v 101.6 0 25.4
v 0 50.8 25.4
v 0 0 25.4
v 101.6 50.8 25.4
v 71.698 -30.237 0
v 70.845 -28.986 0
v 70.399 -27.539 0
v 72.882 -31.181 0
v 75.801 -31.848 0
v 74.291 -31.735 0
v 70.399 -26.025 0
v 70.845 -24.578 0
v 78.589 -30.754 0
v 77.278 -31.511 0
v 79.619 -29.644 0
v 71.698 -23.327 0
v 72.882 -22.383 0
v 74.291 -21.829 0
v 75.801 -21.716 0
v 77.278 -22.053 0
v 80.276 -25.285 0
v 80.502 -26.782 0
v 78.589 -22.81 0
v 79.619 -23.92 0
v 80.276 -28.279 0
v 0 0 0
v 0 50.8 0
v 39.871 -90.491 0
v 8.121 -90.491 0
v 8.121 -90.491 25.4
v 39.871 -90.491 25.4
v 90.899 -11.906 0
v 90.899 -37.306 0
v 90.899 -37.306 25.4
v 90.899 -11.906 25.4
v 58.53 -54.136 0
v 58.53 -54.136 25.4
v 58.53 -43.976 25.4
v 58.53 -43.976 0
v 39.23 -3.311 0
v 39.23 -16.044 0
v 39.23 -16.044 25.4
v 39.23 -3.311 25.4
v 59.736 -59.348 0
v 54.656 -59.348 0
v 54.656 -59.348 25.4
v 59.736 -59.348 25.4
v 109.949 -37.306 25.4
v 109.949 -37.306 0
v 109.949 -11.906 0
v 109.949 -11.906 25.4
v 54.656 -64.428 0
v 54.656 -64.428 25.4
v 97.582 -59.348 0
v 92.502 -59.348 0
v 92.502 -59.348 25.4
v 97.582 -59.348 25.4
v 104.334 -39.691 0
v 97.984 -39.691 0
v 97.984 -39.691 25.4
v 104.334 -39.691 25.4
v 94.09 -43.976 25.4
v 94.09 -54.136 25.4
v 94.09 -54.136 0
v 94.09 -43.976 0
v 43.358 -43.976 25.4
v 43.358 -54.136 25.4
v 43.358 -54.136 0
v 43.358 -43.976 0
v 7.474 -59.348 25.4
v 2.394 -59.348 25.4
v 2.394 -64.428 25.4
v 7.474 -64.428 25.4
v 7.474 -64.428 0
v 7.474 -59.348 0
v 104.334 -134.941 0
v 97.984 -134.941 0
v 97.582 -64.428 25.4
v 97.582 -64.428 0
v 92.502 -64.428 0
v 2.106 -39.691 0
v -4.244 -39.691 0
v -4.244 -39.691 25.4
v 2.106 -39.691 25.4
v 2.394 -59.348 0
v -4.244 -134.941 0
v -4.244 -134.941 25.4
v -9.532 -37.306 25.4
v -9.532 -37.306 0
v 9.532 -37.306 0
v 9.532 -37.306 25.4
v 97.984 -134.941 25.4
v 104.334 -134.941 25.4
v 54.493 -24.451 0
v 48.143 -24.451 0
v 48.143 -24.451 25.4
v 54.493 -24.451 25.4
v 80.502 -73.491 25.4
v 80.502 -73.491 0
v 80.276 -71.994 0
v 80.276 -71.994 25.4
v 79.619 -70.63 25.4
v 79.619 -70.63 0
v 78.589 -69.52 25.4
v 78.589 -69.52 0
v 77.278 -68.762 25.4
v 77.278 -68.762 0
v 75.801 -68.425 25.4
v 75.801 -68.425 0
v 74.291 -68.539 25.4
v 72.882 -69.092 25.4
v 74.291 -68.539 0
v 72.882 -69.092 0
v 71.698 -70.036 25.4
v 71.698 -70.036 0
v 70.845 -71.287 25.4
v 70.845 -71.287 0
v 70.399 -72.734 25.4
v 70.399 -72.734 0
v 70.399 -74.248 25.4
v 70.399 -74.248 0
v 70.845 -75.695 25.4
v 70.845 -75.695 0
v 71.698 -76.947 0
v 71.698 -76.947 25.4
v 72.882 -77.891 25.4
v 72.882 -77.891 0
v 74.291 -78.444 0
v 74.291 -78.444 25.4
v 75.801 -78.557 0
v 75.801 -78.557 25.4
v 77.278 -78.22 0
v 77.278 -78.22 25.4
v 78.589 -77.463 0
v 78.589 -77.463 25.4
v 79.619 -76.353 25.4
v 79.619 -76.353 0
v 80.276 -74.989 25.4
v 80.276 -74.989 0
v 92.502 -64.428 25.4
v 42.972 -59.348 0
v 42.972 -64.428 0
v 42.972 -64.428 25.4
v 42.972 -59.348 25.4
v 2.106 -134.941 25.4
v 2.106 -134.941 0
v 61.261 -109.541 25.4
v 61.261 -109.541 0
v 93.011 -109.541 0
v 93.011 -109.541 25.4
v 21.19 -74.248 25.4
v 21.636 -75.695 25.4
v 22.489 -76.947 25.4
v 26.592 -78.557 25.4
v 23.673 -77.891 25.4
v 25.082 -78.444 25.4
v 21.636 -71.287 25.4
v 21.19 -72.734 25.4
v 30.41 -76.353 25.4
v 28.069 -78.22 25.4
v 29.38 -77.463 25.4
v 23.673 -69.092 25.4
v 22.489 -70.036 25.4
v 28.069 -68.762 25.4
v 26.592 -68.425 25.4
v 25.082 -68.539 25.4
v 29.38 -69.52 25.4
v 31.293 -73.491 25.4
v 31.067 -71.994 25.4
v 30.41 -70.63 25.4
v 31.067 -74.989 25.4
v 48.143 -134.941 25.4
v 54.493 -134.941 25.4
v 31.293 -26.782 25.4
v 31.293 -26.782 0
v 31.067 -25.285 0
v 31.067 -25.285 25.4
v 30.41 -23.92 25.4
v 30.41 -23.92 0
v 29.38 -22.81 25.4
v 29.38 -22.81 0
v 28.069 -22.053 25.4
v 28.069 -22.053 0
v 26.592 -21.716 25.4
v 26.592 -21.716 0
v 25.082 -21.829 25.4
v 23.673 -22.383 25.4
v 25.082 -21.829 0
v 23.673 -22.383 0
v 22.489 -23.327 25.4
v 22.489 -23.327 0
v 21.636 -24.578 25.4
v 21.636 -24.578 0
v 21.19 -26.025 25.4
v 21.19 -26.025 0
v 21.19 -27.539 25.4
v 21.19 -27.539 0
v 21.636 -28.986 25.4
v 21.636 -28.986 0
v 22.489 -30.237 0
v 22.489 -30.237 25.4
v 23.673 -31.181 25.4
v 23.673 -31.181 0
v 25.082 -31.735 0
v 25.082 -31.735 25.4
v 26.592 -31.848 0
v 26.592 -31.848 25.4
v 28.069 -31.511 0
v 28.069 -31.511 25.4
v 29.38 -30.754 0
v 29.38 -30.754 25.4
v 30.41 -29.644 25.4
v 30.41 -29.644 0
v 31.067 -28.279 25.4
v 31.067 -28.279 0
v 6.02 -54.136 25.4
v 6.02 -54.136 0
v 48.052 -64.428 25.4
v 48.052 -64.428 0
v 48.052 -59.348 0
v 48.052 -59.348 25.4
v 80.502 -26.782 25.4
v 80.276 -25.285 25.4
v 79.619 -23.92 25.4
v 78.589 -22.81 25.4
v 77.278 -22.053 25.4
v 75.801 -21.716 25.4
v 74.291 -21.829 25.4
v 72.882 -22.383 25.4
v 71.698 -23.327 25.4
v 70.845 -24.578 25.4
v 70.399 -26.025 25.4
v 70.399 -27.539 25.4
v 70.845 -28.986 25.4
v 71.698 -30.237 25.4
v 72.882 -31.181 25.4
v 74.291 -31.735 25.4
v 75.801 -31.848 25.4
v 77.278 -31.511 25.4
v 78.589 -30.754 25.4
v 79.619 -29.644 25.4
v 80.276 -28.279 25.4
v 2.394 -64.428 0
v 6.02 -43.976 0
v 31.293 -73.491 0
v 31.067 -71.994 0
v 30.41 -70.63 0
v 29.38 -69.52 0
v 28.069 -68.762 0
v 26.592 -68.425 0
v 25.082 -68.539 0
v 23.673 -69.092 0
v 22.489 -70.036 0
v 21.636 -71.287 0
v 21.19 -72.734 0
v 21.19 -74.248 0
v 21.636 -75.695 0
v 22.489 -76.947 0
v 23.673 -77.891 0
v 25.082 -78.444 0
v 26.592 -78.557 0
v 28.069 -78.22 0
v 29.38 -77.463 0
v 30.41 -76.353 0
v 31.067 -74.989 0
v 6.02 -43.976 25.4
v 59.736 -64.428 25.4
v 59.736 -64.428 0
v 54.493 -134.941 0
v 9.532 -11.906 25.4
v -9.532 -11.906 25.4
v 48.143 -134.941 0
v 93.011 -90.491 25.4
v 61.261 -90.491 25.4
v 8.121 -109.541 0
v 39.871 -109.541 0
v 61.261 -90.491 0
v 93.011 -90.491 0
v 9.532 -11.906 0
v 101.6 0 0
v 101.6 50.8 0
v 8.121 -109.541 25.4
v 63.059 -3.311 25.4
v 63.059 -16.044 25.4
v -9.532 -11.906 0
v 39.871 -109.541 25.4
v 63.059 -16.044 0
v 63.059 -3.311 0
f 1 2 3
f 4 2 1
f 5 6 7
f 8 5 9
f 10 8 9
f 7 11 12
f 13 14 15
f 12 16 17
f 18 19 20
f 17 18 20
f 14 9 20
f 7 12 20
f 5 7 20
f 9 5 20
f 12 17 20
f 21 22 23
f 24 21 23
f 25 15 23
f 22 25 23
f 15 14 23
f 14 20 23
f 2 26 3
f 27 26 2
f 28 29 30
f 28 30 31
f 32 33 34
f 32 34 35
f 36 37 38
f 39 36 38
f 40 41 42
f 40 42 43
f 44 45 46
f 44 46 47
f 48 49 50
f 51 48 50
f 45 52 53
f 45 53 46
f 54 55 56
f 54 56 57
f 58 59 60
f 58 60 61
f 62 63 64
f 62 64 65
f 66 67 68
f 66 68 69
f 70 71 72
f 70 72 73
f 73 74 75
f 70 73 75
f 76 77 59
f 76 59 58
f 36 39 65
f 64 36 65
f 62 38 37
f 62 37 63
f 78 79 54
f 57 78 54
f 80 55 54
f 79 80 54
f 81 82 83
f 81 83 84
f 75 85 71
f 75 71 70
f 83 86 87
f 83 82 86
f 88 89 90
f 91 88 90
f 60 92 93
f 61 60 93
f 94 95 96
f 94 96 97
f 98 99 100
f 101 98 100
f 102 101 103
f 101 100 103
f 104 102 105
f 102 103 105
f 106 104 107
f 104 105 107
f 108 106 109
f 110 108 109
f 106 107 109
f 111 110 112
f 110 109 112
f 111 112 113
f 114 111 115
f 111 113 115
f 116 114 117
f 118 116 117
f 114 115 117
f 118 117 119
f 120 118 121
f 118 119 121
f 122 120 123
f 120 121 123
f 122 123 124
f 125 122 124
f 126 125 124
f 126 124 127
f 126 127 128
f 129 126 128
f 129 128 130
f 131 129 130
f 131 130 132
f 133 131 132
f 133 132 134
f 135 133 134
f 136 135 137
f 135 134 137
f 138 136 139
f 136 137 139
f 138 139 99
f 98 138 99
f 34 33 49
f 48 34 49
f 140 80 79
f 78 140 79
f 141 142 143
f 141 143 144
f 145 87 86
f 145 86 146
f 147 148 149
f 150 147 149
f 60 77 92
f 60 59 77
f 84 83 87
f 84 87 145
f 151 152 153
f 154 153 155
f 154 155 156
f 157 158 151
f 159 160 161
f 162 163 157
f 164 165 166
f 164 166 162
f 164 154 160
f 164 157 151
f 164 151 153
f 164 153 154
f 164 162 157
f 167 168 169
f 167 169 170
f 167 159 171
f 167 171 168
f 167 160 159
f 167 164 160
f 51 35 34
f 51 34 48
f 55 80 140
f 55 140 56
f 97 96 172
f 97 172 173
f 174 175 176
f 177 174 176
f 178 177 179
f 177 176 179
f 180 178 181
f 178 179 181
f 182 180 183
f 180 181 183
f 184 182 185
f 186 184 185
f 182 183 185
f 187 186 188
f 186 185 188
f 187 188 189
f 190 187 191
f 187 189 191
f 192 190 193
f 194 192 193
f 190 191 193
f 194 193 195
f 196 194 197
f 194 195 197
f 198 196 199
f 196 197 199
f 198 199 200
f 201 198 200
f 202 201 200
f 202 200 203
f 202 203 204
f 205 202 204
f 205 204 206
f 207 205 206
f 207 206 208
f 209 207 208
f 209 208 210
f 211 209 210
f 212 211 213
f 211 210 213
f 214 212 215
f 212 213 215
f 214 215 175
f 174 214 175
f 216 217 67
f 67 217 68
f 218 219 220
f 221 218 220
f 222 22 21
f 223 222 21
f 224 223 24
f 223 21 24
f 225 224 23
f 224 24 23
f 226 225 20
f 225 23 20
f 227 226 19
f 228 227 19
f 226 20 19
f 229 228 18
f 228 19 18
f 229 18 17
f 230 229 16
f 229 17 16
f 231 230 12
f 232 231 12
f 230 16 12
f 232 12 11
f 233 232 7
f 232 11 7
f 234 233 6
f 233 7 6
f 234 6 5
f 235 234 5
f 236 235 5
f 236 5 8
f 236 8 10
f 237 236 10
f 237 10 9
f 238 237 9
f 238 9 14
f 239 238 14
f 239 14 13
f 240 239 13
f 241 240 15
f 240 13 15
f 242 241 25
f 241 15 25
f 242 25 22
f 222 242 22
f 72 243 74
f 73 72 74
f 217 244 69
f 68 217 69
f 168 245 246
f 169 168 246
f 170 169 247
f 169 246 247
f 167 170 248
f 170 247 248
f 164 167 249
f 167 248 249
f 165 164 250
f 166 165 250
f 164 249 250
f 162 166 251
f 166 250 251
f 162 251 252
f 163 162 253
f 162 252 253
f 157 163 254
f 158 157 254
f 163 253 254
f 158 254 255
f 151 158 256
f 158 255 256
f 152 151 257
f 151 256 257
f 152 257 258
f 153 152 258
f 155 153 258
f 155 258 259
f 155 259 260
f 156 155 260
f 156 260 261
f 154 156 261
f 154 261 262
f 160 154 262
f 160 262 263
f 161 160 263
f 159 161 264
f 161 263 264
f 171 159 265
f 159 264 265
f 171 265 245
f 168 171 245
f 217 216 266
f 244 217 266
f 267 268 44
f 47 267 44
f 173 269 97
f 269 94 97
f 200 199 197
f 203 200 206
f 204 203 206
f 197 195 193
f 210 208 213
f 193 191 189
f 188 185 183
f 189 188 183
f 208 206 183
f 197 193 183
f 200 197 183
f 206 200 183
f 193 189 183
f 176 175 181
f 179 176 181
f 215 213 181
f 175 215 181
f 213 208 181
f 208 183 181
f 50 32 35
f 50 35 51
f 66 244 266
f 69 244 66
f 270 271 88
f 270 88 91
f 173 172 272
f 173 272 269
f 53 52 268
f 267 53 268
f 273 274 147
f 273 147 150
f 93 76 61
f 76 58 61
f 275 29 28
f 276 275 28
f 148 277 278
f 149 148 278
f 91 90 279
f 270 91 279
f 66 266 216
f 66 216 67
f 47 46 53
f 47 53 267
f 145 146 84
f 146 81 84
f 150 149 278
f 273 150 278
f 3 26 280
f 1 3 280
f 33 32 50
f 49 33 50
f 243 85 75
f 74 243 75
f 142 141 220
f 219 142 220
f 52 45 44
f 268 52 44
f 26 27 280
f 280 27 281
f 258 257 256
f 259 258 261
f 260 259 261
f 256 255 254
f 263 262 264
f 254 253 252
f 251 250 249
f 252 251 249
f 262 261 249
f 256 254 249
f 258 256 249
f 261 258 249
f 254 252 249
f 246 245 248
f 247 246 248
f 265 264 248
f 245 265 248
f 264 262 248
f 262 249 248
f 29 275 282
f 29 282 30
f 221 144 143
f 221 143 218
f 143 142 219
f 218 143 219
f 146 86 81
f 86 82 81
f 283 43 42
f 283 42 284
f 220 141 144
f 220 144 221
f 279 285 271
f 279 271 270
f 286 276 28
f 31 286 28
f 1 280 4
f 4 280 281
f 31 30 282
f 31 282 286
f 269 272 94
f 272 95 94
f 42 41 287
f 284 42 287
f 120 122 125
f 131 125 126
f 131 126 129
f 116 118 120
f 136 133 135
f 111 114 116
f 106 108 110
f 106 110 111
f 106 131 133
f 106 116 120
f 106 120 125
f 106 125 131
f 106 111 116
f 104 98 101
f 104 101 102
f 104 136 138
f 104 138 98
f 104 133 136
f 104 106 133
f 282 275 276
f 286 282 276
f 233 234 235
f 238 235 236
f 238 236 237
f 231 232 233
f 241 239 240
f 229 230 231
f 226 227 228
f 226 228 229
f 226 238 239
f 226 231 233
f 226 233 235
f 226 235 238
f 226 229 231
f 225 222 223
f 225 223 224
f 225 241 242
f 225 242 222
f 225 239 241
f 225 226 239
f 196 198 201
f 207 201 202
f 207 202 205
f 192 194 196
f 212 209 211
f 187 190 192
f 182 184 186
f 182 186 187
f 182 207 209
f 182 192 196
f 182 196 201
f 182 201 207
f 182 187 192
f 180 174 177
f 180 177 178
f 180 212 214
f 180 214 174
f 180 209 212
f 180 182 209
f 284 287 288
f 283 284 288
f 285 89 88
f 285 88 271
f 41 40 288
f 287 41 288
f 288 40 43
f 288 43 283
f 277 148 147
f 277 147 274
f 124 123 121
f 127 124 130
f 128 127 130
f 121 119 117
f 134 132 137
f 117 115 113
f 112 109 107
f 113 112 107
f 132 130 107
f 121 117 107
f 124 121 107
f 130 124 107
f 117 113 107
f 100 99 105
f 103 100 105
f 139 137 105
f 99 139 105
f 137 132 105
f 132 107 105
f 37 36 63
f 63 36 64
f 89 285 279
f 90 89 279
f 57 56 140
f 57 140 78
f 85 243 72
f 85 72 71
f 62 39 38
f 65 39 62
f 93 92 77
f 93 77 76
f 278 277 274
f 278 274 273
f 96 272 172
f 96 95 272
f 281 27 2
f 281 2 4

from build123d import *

# Parameters (mm, degrees)
F0_W      = 101.6
F0_H      = 50.8
F1_DEPTH  = 25.4
F2_W      = 19.06345
F2_H      = 25.4
F2_W_2    = 19.05
F3_DEPTH  = 25.4
F4_W      = 23.829037
F4_H      = 12.733073
F4_W_2    = 6.35
F4_H_2    = 85.09
F4_H_3    = 69.85
F4_W_3    = 37.338
F4_H_4    = 10.16
F4_W_4    = 35.56
F4_W_5    = 31.75
F4_H_5    = 19.05
F5_DEPTH  = 25.4
F6_W      = 5.08
F6_H      = 5.08
F7_DEPTH  = 25.4
F8_R      = 5.08
F9_DEPTH  = 25.4
F10_W     = 6.35
F10_H     = 25.4
F11_DEPTH = 25.4
F12_W     = 6.35
F12_H     = 25.4
F13_DEPTH = 25.4
F5_FACE_W = 6.35
F5_FACE_H = 25.4
F14_DEPTH = 25.4


with BuildPart() as f1:
    # F0 (on Top) → F1 (new body)
    with BuildSketch(Plane.XY):
        with Locations((50.8, 25.4)):
            Rectangle(F0_W, F0_H)
    extrude(amount=F1_DEPTH)


with BuildPart() as f3:
    # F2 (on Top) → F3 (new body)
    with BuildSketch(Plane.XY):
        with Locations((0, -24.606252)):
            Rectangle(F2_W, F2_H)
        with Locations((100.423648, -24.606252)):
            Rectangle(F2_W_2, F2_H)
    extrude(amount=F3_DEPTH)


with BuildPart() as f5:
    # F4 (on Top) → F5 (new body)
    with BuildSketch(Plane.XY):
        with Locations((51.144479, -9.677504)):
            Rectangle(F4_W, F4_H)
        with Locations((51.31811, -66.996174)):
            Rectangle(F4_W_2, F4_H_2)
        with Locations((101.158992, -74.616174)):
            Rectangle(F4_W_2, F4_H_3)
        with Locations((-1.069389, -74.616174)):
            Rectangle(F4_W_2, F4_H_3)
        with Locations((24.689177, -49.056164)):
            Rectangle(F4_W_3, F4_H_4)
        with Locations((76.310364, -49.056164)):
            Rectangle(F4_W_4, F4_H_4)
        with Locations((23.995585, -100.016174)):
            Rectangle(F4_W_5, F4_H_5)
        with Locations((77.135894, -100.016174)):
            Rectangle(F4_W_5, F4_H_5)
    extrude(amount=F5_DEPTH)

    # F10 (on face) → F11 (join)
    with BuildSketch(Plane.XZ.offset(109.541174)):
        with Locations((51.31811, 12.7)):
            Rectangle(F10_W, F10_H)
    extrude(amount=F11_DEPTH)

    # F12 (on face) → F13 (join)
    with BuildSketch(Plane.XZ.offset(109.541174)):
        with Locations((101.158992, 12.7)):
            Rectangle(F12_W, F12_H)
    extrude(amount=F13_DEPTH)

    # F5_face (on face) → F14 (join)
    with BuildSketch(Plane(origin=(51.31811, -109.541174, 12.7), x_dir=(1, 0, 0), z_dir=(0, -1, 0))):
        with Locations((-52.387499, 0)):
            Rectangle(F5_FACE_W, F5_FACE_H)
    extrude(amount=F14_DEPTH)


with BuildPart() as f7:
    # F6 (on Top) → F7 (new body)
    with BuildSketch(Plane.XY):
        with Locations((4.934179, -61.888158)):
            Rectangle(F6_W, F6_H)
        with Locations((45.512468, -61.888158)):
            Rectangle(F6_W, F6_H)
        with Locations((57.196468, -61.888158)):
            Rectangle(F6_W, F6_H)
        with Locations((95.042468, -61.888158)):
            Rectangle(F6_W, F6_H)
    extrude(amount=F7_DEPTH)


with BuildPart() as f9:
    # F8 (on Top) → F9 (new body)
    with BuildSketch(Plane.XY):
        with Locations((26.212817, -26.782004)):
            Circle(F8_R)
        with Locations((75.421803, -26.782004)):
            Circle(F8_R)
        with Locations((75.421803, -73.491231)):
            Circle(F8_R)
        with Locations((26.212817, -73.491231)):
            Circle(F8_R)
    extrude(amount=F9_DEPTH)


solid = Compound([f1.part, f3.part, f5.part, f7.part, f9.part])
